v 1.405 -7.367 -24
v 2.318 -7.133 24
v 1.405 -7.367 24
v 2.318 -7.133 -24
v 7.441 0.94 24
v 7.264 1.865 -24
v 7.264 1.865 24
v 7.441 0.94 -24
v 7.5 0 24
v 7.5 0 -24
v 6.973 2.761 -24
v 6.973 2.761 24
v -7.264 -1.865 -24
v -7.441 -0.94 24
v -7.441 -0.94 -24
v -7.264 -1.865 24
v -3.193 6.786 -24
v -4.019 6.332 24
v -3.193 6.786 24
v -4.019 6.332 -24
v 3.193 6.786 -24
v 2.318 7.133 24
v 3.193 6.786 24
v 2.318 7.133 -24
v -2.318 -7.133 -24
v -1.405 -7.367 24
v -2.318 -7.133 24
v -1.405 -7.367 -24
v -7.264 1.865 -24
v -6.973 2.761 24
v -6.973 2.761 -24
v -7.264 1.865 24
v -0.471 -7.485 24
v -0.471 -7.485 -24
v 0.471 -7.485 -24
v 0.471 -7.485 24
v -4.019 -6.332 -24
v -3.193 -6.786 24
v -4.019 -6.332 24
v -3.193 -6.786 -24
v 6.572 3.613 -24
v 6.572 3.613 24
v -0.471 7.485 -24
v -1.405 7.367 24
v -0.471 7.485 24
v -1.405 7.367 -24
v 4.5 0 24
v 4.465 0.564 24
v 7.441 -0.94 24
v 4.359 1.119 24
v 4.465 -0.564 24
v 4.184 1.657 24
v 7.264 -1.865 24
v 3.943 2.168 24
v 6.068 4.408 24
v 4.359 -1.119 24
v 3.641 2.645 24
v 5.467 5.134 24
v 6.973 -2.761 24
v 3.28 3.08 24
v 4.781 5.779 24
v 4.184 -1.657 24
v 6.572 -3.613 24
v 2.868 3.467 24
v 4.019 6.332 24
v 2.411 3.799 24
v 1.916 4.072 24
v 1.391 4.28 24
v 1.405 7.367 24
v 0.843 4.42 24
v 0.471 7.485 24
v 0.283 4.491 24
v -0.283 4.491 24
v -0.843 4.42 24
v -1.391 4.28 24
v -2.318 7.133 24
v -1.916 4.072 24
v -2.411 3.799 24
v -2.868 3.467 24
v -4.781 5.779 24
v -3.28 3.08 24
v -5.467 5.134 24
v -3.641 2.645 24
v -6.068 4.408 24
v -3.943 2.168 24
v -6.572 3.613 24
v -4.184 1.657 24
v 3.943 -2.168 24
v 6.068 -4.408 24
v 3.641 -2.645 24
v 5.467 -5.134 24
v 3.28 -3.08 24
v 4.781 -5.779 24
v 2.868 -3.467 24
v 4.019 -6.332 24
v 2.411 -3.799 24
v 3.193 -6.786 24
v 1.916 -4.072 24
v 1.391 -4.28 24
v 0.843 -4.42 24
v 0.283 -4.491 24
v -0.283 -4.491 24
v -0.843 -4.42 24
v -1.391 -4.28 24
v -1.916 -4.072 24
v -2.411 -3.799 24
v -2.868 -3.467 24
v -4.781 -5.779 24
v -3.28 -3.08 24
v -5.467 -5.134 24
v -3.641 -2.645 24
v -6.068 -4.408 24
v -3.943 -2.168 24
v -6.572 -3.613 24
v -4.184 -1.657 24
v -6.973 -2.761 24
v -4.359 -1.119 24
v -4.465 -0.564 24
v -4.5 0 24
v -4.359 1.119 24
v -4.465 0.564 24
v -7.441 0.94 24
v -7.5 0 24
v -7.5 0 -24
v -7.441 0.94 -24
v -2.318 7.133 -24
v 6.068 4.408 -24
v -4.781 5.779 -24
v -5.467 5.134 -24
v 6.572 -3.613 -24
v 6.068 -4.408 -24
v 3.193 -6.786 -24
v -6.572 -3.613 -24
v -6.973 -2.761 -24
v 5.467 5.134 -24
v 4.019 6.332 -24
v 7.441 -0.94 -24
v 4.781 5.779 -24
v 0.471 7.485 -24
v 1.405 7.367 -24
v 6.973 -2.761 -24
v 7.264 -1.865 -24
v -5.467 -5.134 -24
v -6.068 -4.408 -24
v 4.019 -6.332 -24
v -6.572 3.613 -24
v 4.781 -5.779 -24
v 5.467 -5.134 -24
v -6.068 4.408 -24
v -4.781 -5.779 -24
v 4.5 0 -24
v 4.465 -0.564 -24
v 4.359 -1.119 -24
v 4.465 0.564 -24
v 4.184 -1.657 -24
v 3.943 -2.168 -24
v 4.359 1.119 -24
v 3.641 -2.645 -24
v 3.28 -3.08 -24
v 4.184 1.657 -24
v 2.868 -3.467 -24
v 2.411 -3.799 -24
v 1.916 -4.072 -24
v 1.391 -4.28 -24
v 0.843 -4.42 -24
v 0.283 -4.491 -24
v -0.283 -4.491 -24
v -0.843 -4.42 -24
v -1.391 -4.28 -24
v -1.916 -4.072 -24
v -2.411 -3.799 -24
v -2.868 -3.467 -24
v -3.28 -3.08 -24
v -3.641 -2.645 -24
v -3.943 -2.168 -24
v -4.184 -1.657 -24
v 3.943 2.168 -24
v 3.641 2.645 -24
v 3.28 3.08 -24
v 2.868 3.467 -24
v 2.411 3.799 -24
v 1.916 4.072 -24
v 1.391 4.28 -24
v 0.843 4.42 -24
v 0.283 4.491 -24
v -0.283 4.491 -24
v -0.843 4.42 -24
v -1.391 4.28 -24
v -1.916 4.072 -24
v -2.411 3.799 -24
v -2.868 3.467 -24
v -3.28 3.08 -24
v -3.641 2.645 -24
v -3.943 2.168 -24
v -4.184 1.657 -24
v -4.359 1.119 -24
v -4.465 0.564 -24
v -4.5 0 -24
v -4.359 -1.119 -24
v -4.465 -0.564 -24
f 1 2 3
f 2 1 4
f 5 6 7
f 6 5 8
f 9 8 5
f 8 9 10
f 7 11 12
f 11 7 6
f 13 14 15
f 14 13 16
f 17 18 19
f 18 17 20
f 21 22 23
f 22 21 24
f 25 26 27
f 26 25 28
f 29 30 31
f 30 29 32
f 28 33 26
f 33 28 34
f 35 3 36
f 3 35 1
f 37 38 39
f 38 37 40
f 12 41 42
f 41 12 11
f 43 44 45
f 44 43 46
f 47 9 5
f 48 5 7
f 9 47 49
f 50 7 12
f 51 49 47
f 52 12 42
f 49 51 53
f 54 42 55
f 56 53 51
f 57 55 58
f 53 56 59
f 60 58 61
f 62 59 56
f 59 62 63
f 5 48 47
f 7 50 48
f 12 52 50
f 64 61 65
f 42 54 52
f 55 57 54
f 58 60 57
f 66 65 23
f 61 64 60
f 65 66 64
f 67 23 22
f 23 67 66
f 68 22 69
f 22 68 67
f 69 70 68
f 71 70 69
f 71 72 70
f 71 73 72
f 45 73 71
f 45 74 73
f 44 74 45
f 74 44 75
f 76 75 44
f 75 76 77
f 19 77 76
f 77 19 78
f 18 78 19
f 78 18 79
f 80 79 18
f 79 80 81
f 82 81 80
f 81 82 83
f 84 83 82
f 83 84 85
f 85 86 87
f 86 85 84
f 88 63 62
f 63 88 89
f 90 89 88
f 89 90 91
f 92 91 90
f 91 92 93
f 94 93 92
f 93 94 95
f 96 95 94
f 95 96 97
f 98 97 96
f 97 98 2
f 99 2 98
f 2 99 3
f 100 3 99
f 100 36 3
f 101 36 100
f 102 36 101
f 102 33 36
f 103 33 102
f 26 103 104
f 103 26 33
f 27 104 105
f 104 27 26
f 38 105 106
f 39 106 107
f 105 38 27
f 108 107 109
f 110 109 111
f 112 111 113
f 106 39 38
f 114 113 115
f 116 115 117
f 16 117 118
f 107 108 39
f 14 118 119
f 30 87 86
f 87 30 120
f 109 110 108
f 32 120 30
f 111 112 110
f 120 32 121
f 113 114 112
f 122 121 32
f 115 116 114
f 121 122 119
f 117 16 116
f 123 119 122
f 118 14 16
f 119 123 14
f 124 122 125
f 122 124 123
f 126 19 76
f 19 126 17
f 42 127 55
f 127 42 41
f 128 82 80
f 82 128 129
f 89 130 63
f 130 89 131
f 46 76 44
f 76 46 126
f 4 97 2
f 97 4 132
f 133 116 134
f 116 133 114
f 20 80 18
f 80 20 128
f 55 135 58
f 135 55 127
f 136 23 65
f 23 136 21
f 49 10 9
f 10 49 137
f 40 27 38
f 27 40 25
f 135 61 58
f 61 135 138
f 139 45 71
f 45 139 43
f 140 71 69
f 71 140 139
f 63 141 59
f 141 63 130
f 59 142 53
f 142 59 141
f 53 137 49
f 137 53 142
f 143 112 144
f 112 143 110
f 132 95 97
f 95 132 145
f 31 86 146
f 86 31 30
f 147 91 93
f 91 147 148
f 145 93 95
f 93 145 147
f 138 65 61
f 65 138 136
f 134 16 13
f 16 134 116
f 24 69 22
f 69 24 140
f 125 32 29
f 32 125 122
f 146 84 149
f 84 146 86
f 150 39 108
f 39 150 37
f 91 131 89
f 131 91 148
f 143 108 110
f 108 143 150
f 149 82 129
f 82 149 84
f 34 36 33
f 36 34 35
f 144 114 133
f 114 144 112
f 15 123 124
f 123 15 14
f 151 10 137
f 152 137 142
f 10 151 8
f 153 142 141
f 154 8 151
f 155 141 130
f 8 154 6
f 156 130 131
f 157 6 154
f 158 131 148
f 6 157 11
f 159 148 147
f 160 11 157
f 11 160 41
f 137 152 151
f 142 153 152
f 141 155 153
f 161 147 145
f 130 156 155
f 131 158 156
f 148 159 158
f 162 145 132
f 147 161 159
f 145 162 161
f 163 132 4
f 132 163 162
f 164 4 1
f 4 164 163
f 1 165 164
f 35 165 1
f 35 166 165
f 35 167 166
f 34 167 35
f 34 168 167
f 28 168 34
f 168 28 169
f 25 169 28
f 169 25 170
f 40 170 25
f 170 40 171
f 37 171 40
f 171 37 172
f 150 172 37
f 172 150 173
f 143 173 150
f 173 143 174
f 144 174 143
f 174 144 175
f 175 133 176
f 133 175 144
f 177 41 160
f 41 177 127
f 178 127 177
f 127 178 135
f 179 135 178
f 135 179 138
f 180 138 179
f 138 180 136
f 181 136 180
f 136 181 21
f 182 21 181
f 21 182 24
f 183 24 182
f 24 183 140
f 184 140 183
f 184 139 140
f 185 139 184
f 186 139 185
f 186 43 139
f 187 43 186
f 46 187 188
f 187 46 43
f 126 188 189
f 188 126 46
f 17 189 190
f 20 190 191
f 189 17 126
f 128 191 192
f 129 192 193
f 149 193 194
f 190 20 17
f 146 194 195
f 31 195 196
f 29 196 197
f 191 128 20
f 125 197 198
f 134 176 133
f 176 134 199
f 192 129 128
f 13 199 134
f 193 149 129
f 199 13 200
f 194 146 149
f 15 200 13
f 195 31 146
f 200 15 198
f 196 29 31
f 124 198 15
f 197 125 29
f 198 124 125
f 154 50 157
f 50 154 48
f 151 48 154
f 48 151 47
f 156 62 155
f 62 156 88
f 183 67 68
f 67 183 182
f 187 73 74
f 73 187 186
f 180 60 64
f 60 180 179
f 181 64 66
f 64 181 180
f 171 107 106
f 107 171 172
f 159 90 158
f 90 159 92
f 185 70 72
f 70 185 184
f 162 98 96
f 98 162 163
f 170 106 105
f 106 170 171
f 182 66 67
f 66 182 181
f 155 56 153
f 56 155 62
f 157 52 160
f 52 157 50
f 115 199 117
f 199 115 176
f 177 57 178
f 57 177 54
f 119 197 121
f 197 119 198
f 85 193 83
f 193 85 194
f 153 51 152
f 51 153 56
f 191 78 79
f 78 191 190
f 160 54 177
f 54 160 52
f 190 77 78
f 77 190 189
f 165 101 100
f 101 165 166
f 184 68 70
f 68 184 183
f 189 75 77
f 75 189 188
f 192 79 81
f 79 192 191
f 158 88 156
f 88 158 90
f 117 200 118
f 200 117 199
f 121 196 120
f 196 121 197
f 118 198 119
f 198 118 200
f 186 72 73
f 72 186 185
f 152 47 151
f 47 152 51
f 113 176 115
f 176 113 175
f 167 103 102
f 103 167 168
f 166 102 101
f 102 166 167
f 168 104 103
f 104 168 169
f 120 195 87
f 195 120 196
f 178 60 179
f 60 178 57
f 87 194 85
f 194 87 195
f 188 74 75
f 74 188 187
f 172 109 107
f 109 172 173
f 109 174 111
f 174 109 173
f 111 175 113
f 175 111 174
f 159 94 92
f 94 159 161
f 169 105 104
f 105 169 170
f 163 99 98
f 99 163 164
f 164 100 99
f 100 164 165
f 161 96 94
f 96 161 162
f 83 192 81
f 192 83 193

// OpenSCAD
$fn = 50;


difference() {
	union() {
		translate(v = [0, 0, -24.0000000000]) {
			cylinder(h = 48, r = 7.5000000000);
		}
	}
	union() {
		translate(v = [0, 0, -100.0000000000]) {
			cylinder(h = 200, r = 4.5000000000);
		}
	}
}
